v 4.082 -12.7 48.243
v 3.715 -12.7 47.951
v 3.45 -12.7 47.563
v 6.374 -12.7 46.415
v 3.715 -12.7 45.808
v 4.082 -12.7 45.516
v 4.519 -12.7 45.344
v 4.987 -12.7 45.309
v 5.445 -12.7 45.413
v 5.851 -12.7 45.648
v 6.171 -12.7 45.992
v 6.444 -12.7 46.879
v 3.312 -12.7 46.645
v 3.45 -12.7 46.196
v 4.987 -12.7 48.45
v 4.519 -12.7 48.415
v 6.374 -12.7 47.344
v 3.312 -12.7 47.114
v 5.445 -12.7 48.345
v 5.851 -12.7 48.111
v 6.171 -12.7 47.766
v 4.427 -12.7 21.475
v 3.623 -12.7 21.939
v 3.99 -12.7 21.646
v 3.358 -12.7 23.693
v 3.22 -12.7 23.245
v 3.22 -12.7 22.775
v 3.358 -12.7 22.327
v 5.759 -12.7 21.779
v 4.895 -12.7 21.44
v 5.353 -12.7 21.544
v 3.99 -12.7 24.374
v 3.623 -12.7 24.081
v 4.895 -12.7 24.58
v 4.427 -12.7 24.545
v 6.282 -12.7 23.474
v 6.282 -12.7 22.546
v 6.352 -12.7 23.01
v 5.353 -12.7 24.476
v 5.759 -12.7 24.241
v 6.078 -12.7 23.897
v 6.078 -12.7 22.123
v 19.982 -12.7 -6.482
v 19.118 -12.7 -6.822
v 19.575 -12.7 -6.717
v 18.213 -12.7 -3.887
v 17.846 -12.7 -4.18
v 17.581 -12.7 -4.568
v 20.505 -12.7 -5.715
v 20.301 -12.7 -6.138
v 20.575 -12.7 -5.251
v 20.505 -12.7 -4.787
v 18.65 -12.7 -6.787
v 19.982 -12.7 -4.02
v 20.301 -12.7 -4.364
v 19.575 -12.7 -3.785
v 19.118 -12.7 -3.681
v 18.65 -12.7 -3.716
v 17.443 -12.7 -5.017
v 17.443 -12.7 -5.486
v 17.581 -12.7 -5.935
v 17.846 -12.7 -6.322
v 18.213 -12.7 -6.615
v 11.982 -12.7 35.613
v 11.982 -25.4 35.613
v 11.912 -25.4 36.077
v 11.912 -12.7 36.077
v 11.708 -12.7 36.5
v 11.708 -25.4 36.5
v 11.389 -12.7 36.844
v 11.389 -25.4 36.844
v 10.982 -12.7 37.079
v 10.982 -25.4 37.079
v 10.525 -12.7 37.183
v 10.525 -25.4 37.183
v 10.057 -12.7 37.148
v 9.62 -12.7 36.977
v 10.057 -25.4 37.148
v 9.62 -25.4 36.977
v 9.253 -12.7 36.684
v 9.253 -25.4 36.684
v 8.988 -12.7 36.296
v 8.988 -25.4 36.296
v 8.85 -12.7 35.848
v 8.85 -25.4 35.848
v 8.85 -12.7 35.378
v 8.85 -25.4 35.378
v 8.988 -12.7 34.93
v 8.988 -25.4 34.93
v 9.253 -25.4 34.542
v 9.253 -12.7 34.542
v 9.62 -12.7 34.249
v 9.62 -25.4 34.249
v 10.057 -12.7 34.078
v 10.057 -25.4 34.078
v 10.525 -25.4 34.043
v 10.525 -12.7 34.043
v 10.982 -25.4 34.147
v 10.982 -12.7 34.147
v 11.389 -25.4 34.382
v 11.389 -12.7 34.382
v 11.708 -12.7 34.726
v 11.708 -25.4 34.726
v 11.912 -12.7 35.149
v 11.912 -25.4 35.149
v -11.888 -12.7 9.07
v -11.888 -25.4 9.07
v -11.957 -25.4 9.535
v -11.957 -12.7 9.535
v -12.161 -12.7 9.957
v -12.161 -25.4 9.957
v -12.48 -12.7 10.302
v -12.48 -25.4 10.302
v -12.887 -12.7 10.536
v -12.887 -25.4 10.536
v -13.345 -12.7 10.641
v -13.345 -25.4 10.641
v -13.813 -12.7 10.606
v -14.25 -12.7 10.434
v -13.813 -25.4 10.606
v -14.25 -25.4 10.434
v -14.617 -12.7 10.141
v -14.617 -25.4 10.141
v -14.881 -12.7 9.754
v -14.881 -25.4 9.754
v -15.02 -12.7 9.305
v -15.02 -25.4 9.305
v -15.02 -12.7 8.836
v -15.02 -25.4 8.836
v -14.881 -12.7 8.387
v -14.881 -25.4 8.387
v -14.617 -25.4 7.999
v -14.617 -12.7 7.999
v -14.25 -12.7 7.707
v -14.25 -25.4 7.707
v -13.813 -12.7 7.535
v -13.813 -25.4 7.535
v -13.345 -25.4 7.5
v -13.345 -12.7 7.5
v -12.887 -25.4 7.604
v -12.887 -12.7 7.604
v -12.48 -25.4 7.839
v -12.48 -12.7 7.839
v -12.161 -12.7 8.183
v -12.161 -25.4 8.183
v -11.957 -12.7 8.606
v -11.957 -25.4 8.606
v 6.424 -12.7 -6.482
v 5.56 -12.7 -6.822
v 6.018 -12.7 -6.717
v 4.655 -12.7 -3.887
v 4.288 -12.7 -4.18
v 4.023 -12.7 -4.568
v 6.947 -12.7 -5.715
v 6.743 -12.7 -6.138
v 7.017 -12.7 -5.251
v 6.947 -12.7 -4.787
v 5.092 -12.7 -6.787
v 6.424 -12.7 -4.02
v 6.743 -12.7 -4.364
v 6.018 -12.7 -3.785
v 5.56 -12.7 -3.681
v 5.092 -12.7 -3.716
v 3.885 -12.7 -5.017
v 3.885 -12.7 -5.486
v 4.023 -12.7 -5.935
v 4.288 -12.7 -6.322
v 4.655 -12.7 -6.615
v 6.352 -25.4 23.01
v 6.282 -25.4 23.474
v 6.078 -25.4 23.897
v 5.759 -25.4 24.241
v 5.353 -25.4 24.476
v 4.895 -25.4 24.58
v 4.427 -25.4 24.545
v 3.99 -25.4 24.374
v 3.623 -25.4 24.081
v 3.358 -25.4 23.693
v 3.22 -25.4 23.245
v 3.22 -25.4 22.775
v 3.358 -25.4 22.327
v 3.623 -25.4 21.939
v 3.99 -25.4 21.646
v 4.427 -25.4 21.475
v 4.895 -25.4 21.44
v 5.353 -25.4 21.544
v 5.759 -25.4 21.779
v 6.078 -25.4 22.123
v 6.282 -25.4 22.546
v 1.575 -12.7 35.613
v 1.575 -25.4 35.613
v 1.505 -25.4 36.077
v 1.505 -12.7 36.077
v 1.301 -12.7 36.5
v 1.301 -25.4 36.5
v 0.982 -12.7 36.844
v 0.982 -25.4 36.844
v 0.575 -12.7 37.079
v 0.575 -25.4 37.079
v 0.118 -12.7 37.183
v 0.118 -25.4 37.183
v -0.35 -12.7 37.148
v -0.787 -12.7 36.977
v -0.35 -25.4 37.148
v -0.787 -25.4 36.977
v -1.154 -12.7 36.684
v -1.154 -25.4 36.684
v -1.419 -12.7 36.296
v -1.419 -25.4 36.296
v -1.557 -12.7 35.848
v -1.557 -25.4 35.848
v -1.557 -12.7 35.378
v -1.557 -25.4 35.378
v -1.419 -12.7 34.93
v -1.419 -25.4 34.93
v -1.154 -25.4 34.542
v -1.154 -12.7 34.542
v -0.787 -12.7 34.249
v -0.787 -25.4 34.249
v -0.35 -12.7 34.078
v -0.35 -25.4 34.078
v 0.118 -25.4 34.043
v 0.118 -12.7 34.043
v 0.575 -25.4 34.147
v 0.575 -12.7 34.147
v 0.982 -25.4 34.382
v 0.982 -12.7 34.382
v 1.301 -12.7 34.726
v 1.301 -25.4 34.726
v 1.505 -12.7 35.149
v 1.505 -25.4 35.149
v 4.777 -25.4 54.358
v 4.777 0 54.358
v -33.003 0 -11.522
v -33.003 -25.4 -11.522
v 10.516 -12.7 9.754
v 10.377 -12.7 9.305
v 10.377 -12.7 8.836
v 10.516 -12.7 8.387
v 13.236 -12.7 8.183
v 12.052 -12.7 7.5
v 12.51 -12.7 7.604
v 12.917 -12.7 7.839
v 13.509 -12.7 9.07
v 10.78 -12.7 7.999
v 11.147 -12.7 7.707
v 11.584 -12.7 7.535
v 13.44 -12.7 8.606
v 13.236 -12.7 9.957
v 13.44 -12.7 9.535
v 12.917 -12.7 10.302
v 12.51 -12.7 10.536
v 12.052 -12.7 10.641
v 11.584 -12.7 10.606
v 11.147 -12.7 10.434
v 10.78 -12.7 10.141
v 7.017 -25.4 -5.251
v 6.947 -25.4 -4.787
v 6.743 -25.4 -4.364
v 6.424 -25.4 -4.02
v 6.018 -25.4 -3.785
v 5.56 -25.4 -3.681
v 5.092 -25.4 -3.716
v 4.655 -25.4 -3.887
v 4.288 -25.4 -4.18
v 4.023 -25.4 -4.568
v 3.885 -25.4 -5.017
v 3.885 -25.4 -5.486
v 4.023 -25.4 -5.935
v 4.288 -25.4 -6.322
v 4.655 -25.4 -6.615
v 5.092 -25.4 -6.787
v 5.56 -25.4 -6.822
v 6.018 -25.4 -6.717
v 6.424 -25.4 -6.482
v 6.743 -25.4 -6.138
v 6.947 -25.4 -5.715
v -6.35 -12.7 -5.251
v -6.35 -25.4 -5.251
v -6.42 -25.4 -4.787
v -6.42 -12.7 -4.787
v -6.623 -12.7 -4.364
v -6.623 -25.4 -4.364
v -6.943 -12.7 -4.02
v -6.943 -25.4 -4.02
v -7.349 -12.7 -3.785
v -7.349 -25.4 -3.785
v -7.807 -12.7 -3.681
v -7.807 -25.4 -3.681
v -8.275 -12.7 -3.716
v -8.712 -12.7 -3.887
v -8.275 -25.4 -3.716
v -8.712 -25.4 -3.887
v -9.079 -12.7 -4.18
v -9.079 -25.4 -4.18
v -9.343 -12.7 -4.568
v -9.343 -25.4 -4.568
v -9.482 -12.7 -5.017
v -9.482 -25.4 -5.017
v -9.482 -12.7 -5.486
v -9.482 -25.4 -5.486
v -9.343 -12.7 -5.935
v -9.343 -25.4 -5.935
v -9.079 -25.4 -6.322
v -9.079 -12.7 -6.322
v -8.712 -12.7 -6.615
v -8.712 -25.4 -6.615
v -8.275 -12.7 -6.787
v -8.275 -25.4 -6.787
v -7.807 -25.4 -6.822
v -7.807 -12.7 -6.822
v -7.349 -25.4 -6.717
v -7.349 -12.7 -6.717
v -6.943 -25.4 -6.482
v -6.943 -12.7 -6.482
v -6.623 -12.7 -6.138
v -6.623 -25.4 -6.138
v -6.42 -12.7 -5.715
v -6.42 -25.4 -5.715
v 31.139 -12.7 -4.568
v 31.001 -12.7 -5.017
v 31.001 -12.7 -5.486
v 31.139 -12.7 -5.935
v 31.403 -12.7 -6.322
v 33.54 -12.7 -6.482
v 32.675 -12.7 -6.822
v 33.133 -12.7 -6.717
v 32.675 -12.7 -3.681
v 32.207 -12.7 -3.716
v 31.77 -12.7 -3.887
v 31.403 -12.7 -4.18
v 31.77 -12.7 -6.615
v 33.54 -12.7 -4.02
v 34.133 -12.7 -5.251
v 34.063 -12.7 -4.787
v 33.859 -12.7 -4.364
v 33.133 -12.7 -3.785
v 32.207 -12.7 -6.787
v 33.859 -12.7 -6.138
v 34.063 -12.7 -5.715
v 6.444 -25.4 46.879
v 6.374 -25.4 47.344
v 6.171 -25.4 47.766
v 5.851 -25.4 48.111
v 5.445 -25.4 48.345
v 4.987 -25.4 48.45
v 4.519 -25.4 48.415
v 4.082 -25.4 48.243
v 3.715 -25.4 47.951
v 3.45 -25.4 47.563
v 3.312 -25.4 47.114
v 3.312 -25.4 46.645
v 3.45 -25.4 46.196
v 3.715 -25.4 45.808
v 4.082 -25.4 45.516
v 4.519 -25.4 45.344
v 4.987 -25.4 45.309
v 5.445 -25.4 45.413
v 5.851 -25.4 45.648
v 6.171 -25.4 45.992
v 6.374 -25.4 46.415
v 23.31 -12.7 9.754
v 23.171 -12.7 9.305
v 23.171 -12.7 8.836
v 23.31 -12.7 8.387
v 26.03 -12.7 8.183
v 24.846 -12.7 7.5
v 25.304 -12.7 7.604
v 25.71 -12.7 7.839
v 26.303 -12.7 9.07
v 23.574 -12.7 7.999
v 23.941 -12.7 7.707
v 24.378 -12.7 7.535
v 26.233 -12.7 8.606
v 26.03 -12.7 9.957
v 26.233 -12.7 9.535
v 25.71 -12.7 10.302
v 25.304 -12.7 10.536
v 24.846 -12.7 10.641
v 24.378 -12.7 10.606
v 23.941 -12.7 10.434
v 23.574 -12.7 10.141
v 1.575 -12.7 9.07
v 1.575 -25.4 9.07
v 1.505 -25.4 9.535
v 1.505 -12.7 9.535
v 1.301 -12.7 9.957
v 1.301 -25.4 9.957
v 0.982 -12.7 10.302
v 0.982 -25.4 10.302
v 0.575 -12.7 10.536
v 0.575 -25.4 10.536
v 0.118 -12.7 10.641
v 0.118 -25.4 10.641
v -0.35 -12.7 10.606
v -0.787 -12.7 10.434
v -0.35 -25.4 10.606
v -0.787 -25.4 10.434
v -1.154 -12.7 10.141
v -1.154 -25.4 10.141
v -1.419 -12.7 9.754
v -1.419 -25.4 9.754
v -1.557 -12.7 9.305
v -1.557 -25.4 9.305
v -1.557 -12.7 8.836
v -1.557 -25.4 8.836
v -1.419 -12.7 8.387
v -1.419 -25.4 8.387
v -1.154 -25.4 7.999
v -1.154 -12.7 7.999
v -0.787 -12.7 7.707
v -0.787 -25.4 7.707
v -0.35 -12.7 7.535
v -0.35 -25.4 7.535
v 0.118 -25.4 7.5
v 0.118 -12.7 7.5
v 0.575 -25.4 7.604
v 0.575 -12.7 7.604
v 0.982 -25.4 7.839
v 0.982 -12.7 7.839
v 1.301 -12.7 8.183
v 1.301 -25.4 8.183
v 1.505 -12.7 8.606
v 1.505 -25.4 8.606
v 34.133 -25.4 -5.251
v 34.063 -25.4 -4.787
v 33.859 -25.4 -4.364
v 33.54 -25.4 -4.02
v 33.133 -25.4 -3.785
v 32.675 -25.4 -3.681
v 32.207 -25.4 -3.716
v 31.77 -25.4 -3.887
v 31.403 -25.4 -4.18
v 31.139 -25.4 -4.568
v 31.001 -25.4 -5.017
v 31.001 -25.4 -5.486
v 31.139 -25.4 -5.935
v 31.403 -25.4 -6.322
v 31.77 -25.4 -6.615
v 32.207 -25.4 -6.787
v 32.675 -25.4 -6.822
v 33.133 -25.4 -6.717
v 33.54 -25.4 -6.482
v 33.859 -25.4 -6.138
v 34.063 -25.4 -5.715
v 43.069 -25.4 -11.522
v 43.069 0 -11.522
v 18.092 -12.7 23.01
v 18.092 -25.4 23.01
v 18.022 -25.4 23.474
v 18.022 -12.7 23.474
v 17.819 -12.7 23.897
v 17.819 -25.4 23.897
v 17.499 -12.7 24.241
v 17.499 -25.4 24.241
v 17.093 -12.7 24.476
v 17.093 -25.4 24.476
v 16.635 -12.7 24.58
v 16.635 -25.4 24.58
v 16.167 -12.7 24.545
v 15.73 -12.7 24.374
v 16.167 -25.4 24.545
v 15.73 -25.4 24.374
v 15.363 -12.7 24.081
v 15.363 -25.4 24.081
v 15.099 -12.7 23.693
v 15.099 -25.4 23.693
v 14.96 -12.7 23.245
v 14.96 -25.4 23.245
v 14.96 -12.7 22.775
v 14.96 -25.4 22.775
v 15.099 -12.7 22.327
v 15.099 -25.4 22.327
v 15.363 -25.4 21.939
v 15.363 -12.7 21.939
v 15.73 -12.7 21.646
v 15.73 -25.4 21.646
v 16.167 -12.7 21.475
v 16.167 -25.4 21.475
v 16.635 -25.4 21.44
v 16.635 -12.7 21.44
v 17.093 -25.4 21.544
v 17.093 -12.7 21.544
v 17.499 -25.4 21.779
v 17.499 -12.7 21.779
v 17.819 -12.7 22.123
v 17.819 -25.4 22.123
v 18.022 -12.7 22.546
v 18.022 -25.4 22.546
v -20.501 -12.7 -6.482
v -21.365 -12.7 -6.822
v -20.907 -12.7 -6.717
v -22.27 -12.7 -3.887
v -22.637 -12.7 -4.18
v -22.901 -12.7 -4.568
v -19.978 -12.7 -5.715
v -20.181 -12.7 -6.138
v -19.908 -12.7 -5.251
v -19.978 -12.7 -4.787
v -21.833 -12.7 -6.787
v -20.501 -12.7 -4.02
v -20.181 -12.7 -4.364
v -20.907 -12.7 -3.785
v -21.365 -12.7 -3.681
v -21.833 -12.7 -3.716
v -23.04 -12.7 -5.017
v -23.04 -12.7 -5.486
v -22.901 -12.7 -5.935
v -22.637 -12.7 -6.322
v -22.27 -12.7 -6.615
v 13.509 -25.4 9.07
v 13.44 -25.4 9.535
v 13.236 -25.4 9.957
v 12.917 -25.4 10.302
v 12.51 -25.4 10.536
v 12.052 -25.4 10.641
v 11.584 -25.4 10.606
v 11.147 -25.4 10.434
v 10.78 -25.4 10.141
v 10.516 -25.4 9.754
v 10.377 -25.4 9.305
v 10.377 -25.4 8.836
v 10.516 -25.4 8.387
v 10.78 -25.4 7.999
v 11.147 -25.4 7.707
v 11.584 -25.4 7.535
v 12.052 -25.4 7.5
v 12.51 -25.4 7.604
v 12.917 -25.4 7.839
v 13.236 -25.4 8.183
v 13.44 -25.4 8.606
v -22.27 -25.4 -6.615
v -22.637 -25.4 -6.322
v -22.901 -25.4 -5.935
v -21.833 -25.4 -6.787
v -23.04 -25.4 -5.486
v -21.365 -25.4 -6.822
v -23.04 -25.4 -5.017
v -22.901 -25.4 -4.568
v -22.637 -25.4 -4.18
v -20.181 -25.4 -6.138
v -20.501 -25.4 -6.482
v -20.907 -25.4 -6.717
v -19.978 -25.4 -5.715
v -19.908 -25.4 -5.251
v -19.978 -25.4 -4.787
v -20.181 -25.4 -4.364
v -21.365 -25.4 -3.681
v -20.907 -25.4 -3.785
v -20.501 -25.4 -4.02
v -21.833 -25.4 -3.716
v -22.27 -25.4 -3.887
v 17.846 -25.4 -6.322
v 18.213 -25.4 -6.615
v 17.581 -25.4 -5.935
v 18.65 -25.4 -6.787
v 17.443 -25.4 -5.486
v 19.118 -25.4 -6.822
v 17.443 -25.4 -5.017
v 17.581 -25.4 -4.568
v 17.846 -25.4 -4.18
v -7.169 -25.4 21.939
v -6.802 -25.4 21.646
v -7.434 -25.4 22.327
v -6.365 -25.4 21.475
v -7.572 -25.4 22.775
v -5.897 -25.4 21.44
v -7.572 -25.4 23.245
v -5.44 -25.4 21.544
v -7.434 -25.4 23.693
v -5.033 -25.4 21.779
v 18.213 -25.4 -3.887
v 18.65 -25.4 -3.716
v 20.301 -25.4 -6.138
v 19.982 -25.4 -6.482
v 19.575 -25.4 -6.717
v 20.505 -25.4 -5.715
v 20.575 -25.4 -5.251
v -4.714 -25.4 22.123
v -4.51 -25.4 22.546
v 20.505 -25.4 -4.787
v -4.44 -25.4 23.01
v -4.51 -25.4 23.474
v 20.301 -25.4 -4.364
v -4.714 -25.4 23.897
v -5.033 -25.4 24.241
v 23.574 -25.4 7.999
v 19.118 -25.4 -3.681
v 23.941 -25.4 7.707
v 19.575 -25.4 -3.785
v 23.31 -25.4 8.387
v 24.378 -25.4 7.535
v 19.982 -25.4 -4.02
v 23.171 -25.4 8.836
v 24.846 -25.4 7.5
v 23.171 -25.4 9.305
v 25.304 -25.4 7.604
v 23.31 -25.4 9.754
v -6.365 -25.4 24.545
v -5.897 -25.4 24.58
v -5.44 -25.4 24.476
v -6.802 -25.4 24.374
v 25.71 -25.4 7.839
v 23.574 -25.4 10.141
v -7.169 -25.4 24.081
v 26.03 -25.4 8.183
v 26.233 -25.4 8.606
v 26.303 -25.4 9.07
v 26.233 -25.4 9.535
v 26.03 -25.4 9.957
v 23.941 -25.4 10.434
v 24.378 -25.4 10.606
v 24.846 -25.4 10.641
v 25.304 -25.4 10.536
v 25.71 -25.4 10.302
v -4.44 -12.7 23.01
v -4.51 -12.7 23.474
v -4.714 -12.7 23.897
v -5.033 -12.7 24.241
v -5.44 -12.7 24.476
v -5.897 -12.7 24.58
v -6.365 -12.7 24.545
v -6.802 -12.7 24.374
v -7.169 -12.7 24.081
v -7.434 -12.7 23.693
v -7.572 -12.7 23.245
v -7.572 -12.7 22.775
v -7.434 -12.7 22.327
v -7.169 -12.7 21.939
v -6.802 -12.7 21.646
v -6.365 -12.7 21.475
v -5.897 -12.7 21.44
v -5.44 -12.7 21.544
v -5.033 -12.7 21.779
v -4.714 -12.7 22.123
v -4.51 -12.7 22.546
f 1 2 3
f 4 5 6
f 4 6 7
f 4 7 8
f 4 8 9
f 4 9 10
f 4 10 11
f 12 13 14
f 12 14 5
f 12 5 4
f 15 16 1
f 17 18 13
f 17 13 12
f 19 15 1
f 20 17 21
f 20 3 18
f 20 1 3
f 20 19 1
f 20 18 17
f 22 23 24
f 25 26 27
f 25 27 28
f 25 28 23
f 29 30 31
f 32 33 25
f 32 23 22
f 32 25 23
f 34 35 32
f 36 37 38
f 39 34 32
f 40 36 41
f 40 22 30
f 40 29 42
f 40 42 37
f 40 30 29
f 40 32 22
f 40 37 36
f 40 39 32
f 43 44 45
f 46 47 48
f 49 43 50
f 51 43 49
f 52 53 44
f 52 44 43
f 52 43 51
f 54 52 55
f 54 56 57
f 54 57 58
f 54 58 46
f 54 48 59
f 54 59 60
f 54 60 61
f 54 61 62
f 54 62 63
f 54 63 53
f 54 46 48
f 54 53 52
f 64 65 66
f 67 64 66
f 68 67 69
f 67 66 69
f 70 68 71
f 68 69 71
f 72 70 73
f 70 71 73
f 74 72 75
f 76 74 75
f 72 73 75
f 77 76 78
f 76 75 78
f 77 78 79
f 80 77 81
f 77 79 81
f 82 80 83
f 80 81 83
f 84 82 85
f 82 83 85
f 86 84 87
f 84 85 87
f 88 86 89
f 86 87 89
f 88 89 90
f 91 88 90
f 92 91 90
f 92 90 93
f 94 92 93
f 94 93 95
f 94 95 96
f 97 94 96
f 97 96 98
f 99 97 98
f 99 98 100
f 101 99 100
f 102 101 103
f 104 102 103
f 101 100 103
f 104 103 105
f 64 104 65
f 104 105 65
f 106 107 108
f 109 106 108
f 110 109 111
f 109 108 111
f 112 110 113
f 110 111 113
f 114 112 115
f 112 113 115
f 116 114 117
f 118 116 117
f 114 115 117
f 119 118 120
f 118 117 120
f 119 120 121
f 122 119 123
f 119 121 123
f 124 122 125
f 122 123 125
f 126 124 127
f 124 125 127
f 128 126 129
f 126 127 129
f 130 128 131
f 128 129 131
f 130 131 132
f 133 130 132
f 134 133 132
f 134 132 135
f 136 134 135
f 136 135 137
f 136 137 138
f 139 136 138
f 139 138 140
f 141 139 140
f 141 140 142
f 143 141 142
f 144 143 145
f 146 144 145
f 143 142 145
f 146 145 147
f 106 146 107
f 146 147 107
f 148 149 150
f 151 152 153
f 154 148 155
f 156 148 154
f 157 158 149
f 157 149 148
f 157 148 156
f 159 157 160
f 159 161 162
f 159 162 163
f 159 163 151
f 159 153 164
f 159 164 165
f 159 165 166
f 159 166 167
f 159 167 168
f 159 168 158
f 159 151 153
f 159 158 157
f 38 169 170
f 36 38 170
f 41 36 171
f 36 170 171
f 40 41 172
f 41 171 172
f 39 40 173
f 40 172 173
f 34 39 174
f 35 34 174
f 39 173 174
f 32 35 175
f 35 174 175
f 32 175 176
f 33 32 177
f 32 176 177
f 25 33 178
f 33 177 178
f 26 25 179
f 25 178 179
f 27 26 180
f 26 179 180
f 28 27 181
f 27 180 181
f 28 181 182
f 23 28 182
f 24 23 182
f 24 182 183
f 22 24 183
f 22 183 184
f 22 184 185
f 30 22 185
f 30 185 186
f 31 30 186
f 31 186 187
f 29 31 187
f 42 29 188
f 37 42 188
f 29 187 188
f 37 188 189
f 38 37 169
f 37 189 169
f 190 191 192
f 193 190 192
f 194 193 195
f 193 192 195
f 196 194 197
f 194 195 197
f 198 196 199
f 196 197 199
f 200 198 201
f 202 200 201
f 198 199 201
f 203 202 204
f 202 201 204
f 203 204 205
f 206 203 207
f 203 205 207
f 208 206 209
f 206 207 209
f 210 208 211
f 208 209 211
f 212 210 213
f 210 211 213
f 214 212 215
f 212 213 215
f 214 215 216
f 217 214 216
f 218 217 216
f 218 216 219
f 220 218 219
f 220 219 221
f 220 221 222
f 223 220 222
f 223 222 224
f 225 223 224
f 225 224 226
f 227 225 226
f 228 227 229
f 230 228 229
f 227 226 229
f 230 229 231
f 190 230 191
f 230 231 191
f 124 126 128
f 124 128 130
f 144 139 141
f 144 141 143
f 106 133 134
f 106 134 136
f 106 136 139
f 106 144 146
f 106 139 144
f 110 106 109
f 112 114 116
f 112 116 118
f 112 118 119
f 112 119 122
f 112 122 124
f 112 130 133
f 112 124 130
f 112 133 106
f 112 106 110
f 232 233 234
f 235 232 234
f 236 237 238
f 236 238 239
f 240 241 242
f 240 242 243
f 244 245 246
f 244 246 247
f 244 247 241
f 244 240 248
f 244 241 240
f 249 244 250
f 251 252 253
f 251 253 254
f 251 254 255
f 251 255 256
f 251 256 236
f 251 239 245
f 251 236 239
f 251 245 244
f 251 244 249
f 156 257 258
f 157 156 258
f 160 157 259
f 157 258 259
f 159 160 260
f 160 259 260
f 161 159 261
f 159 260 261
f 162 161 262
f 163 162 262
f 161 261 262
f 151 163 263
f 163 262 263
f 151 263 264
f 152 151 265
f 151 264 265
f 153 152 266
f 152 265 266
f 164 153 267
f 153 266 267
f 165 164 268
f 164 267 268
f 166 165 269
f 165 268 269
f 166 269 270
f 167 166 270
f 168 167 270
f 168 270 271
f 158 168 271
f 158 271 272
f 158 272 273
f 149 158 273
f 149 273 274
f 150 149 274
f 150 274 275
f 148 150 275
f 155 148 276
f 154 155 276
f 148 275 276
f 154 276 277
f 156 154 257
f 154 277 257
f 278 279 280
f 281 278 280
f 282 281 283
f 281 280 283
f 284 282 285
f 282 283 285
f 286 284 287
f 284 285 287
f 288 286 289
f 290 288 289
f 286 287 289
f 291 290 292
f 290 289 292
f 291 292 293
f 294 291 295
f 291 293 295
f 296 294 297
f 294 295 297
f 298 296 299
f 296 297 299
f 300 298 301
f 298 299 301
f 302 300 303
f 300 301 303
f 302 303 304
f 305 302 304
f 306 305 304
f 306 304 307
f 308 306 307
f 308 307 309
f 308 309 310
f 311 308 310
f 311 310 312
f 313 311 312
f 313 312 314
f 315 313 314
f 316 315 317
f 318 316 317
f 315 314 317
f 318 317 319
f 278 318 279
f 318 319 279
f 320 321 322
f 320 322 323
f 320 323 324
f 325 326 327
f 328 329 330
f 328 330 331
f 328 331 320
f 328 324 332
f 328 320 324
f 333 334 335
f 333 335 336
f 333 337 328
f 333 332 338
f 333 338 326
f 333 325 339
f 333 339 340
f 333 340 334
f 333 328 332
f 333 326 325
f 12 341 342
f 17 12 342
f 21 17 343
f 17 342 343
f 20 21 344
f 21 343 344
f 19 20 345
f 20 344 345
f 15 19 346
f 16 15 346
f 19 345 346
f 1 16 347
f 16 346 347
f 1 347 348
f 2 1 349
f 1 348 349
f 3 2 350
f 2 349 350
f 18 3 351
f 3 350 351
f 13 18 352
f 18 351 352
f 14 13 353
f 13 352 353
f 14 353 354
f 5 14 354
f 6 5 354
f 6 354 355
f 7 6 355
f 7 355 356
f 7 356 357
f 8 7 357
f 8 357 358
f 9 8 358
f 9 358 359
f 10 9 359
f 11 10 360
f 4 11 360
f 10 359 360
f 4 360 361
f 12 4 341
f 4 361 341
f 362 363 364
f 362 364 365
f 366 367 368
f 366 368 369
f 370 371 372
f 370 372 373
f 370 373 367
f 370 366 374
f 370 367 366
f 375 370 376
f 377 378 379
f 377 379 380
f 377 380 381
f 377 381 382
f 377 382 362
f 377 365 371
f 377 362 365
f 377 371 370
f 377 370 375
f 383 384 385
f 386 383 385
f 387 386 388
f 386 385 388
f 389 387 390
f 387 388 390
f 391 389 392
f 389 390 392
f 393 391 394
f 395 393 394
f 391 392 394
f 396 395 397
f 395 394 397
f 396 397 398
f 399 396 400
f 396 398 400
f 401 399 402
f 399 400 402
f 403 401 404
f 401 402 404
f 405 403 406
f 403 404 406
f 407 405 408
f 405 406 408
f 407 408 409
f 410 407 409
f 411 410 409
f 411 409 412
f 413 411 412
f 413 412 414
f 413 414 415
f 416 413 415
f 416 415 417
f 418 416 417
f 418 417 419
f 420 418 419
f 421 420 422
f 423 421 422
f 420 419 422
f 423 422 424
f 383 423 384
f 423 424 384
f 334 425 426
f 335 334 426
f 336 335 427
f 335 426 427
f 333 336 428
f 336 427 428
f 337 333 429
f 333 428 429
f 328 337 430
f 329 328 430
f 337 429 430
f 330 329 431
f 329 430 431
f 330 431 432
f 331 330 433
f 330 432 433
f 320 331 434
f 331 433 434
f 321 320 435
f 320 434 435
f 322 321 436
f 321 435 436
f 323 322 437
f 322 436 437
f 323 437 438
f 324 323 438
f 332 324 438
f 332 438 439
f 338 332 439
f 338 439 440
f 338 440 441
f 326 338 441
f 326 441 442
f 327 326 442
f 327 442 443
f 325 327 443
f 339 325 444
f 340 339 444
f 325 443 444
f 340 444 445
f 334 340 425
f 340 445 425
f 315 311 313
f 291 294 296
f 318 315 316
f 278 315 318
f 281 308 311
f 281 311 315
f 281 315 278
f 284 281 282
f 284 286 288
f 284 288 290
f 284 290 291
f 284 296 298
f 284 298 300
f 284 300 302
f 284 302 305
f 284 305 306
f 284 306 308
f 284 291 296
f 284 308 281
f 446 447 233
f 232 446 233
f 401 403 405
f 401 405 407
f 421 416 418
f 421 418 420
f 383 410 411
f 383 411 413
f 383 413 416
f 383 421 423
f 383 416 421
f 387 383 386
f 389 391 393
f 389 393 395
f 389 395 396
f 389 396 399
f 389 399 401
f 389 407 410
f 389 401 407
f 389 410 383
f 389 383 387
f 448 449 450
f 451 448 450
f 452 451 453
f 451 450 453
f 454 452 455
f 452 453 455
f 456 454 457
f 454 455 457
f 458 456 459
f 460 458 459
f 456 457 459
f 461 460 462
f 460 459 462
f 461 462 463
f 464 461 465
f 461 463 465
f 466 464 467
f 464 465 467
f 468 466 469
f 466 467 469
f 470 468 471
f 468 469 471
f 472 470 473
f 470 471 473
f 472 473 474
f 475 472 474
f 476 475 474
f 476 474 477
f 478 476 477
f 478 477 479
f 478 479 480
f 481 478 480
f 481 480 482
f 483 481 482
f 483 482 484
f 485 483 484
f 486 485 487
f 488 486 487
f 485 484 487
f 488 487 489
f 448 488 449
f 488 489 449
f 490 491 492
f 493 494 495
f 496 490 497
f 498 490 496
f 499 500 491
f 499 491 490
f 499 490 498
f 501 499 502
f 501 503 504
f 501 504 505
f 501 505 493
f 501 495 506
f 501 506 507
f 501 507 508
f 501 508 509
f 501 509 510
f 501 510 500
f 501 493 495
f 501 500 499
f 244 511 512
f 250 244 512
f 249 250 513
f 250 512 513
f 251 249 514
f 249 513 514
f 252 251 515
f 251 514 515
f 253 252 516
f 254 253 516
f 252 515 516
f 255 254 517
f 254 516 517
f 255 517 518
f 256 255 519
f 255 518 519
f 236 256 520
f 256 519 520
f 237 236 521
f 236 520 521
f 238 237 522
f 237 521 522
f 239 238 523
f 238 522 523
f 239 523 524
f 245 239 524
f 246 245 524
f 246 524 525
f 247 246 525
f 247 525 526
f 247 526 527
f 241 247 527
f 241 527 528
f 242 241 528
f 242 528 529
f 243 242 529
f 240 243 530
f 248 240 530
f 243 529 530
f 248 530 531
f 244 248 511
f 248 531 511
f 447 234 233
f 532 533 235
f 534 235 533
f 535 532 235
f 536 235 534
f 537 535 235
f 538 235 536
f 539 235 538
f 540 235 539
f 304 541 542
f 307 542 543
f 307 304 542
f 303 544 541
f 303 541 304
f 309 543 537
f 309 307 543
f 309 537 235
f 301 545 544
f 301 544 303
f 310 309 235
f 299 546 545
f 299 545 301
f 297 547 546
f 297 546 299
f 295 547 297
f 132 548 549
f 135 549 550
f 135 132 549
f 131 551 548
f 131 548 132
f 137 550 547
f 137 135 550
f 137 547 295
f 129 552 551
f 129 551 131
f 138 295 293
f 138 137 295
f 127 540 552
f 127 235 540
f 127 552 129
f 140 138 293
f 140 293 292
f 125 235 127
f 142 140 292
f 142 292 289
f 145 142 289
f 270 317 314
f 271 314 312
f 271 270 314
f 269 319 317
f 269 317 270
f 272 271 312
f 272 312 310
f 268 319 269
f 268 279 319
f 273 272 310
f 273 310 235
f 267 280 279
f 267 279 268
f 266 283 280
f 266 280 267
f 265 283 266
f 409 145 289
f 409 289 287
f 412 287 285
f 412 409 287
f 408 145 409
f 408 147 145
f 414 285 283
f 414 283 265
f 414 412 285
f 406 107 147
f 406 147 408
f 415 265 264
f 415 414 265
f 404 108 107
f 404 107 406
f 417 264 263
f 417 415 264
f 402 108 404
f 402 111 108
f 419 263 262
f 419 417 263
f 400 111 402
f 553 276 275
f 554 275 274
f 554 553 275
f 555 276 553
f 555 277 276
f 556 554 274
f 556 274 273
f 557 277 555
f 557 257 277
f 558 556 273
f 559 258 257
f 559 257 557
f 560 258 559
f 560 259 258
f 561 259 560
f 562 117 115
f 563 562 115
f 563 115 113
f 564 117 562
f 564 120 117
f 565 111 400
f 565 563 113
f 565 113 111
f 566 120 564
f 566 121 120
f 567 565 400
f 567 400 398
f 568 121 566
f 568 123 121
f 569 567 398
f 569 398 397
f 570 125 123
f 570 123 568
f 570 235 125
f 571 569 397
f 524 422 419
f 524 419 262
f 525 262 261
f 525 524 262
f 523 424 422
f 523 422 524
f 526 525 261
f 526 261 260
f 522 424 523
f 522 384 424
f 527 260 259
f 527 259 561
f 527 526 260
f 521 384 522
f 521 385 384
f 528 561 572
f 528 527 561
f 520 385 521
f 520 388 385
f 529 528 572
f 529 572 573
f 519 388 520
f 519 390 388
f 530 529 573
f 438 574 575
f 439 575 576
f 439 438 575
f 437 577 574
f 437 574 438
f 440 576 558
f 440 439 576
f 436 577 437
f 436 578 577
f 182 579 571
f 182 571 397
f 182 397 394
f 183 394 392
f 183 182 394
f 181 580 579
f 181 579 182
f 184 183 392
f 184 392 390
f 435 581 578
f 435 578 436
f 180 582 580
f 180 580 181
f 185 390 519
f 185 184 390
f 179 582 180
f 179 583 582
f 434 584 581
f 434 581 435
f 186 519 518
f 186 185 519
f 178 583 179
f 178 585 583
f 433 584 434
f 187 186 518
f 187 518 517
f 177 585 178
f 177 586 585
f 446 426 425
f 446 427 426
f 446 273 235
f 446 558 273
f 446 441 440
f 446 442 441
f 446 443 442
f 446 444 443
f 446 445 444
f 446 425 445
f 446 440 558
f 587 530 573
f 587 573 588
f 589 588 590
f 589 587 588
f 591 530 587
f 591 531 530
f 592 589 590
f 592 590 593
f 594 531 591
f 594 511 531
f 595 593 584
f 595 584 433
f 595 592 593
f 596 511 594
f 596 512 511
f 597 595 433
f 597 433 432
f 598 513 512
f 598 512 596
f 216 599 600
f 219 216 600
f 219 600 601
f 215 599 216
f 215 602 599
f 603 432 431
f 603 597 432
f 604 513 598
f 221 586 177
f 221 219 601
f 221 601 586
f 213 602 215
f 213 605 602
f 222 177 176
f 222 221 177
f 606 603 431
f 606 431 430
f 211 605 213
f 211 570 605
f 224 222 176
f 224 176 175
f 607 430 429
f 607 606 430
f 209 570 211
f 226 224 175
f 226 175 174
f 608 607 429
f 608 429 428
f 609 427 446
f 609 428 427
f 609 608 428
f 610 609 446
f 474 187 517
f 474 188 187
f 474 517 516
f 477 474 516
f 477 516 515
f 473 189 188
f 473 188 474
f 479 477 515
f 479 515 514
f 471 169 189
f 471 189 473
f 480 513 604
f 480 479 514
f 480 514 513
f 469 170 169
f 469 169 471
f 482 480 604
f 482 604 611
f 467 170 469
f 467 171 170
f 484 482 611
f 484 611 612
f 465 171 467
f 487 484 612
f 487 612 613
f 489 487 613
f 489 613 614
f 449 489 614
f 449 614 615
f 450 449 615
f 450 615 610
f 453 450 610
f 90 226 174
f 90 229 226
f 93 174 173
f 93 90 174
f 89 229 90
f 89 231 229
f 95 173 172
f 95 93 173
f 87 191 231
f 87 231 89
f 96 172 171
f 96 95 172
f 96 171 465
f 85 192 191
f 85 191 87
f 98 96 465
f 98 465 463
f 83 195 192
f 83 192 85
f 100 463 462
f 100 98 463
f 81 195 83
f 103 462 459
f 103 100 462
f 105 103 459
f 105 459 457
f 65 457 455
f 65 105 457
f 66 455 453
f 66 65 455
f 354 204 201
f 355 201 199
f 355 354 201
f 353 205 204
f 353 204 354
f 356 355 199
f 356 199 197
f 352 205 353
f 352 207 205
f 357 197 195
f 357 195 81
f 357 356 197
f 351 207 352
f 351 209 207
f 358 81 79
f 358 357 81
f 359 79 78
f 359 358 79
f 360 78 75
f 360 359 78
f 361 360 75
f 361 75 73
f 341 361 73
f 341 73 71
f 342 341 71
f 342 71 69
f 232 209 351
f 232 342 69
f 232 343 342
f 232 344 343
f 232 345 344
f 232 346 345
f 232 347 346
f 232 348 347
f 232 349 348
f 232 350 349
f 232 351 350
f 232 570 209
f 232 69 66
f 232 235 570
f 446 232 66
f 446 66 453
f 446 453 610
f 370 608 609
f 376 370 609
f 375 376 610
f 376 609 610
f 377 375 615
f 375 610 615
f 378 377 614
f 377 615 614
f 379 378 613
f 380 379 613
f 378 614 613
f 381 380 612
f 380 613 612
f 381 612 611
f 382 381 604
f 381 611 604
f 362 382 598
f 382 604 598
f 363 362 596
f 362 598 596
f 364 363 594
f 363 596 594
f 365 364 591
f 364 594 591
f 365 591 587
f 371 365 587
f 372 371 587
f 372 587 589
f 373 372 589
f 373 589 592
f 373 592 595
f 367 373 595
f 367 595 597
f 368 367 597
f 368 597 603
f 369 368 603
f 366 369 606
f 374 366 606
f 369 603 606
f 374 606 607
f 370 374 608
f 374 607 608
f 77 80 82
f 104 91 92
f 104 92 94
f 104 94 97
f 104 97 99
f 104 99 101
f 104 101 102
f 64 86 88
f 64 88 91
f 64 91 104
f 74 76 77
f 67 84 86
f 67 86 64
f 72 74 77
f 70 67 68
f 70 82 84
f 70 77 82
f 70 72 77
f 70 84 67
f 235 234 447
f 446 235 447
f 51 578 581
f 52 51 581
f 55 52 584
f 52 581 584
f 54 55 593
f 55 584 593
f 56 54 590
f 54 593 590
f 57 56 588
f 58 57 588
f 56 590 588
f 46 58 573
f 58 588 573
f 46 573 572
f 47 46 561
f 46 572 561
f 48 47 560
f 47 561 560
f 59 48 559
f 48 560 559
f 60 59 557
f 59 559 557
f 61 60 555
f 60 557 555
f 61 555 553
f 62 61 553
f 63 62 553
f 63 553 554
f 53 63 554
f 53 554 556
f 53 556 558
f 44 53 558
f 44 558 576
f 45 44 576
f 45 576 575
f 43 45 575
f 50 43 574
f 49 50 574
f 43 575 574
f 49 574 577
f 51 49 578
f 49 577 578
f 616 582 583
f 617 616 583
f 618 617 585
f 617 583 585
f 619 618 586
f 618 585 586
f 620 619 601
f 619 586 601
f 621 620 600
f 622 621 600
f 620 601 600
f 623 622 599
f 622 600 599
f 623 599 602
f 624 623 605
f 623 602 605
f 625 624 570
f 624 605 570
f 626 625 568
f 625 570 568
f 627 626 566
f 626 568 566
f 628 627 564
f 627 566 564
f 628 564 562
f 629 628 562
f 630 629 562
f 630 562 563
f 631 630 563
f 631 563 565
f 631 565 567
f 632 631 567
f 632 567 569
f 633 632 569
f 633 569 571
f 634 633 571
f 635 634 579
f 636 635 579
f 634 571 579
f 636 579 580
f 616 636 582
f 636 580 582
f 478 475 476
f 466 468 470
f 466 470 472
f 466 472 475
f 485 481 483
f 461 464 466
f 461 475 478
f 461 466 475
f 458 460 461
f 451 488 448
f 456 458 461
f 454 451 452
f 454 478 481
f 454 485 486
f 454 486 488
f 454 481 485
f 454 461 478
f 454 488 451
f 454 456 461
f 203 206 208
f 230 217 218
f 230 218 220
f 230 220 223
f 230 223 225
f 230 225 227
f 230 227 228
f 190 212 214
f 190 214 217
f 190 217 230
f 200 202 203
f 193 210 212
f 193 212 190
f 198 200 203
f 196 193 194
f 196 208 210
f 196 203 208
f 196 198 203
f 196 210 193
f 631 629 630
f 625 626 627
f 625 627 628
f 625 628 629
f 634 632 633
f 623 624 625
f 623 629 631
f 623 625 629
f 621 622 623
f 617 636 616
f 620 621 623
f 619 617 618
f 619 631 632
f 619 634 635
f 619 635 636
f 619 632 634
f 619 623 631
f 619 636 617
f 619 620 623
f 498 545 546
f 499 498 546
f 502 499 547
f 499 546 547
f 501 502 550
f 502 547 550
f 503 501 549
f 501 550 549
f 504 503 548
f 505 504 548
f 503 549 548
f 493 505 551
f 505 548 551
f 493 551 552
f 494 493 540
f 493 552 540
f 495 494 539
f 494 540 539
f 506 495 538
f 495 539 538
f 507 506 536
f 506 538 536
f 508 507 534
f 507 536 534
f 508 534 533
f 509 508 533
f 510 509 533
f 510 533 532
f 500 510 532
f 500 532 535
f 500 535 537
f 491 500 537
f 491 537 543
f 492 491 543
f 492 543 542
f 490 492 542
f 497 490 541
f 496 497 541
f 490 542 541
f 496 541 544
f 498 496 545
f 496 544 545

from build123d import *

# Parameters (mm, degrees)
F1_DEPTH  = 25.4
F2_R      = 1.5748
F3_DEPTH  = 12.7
F4_R      = 1.5748
F5_DEPTH  = 12.7
F6_R      = 1.5748
F7_DEPTH  = 12.7
F8_R      = 1.5748
F9_DEPTH  = 12.7
F10_R     = 1.5748
F11_DEPTH = 12.7


with BuildPart() as f1:
    # F0 (on Front) → F1 (new body)
    with BuildSketch(Plane.XZ):
        Polygon((4.777168, 54.35802), (-33.003355, -11.521775), (43.069369, -11.521775), align=None)
    extrude(amount=F1_DEPTH)

    # F2 (on face) → F3 (cut)
    with BuildSketch(Plane.XZ.offset(25.4)):
        with Locations((-21.482399, -5.251253)):
            Circle(F2_R)
        with Locations((-7.924618, -5.251253)):
            Circle(F2_R)
        with Locations((5.442207, -5.251253)):
            Circle(F2_R)
        with Locations((18.999988, -5.251253)):
            Circle(F2_R)
        with Locations((32.557771, -5.251253)):
            Circle(F2_R)
    extrude(amount=-F3_DEPTH, mode=Mode.SUBTRACT)

    # F4 (on face) → F5 (cut)
    with BuildSketch(Plane.XZ.offset(25.4)):
        with Locations((-13.462303, 9.070346)):
            Circle(F4_R)
        with Locations((0, 9.070346)):
            Circle(F4_R)
        with Locations((11.934667, 9.070346)):
            Circle(F4_R)
        with Locations((24.728628, 9.070346)):
            Circle(F4_R)
    extrude(amount=-F5_DEPTH, mode=Mode.SUBTRACT)

    # F6 (on face) → F7 (cut)
    with BuildSketch(Plane.XZ.offset(25.4)):
        with Locations((-6.015072, 23.010036)):
            Circle(F6_R)
        with Locations((4.777168, 23.010036)):
            Circle(F6_R)
        with Locations((16.51758, 23.010036)):
            Circle(F6_R)
    extrude(amount=-F7_DEPTH, mode=Mode.SUBTRACT)

    # F8 (on face) → F9 (cut)
    with BuildSketch(Plane.XZ.offset(25.4)):
        with Locations((0, 35.613045)):
            Circle(F8_R)
        with Locations((10.407028, 35.613045)):
            Circle(F8_R)
    extrude(amount=-F9_DEPTH, mode=Mode.SUBTRACT)

    # F10 (on face) → F11 (cut)
    with BuildSketch(Plane.XZ.offset(25.4)):
        with Locations((4.869344, 46.879366)):
            Circle(F10_R)
    extrude(amount=-F11_DEPTH, mode=Mode.SUBTRACT)


solid = f1.part
